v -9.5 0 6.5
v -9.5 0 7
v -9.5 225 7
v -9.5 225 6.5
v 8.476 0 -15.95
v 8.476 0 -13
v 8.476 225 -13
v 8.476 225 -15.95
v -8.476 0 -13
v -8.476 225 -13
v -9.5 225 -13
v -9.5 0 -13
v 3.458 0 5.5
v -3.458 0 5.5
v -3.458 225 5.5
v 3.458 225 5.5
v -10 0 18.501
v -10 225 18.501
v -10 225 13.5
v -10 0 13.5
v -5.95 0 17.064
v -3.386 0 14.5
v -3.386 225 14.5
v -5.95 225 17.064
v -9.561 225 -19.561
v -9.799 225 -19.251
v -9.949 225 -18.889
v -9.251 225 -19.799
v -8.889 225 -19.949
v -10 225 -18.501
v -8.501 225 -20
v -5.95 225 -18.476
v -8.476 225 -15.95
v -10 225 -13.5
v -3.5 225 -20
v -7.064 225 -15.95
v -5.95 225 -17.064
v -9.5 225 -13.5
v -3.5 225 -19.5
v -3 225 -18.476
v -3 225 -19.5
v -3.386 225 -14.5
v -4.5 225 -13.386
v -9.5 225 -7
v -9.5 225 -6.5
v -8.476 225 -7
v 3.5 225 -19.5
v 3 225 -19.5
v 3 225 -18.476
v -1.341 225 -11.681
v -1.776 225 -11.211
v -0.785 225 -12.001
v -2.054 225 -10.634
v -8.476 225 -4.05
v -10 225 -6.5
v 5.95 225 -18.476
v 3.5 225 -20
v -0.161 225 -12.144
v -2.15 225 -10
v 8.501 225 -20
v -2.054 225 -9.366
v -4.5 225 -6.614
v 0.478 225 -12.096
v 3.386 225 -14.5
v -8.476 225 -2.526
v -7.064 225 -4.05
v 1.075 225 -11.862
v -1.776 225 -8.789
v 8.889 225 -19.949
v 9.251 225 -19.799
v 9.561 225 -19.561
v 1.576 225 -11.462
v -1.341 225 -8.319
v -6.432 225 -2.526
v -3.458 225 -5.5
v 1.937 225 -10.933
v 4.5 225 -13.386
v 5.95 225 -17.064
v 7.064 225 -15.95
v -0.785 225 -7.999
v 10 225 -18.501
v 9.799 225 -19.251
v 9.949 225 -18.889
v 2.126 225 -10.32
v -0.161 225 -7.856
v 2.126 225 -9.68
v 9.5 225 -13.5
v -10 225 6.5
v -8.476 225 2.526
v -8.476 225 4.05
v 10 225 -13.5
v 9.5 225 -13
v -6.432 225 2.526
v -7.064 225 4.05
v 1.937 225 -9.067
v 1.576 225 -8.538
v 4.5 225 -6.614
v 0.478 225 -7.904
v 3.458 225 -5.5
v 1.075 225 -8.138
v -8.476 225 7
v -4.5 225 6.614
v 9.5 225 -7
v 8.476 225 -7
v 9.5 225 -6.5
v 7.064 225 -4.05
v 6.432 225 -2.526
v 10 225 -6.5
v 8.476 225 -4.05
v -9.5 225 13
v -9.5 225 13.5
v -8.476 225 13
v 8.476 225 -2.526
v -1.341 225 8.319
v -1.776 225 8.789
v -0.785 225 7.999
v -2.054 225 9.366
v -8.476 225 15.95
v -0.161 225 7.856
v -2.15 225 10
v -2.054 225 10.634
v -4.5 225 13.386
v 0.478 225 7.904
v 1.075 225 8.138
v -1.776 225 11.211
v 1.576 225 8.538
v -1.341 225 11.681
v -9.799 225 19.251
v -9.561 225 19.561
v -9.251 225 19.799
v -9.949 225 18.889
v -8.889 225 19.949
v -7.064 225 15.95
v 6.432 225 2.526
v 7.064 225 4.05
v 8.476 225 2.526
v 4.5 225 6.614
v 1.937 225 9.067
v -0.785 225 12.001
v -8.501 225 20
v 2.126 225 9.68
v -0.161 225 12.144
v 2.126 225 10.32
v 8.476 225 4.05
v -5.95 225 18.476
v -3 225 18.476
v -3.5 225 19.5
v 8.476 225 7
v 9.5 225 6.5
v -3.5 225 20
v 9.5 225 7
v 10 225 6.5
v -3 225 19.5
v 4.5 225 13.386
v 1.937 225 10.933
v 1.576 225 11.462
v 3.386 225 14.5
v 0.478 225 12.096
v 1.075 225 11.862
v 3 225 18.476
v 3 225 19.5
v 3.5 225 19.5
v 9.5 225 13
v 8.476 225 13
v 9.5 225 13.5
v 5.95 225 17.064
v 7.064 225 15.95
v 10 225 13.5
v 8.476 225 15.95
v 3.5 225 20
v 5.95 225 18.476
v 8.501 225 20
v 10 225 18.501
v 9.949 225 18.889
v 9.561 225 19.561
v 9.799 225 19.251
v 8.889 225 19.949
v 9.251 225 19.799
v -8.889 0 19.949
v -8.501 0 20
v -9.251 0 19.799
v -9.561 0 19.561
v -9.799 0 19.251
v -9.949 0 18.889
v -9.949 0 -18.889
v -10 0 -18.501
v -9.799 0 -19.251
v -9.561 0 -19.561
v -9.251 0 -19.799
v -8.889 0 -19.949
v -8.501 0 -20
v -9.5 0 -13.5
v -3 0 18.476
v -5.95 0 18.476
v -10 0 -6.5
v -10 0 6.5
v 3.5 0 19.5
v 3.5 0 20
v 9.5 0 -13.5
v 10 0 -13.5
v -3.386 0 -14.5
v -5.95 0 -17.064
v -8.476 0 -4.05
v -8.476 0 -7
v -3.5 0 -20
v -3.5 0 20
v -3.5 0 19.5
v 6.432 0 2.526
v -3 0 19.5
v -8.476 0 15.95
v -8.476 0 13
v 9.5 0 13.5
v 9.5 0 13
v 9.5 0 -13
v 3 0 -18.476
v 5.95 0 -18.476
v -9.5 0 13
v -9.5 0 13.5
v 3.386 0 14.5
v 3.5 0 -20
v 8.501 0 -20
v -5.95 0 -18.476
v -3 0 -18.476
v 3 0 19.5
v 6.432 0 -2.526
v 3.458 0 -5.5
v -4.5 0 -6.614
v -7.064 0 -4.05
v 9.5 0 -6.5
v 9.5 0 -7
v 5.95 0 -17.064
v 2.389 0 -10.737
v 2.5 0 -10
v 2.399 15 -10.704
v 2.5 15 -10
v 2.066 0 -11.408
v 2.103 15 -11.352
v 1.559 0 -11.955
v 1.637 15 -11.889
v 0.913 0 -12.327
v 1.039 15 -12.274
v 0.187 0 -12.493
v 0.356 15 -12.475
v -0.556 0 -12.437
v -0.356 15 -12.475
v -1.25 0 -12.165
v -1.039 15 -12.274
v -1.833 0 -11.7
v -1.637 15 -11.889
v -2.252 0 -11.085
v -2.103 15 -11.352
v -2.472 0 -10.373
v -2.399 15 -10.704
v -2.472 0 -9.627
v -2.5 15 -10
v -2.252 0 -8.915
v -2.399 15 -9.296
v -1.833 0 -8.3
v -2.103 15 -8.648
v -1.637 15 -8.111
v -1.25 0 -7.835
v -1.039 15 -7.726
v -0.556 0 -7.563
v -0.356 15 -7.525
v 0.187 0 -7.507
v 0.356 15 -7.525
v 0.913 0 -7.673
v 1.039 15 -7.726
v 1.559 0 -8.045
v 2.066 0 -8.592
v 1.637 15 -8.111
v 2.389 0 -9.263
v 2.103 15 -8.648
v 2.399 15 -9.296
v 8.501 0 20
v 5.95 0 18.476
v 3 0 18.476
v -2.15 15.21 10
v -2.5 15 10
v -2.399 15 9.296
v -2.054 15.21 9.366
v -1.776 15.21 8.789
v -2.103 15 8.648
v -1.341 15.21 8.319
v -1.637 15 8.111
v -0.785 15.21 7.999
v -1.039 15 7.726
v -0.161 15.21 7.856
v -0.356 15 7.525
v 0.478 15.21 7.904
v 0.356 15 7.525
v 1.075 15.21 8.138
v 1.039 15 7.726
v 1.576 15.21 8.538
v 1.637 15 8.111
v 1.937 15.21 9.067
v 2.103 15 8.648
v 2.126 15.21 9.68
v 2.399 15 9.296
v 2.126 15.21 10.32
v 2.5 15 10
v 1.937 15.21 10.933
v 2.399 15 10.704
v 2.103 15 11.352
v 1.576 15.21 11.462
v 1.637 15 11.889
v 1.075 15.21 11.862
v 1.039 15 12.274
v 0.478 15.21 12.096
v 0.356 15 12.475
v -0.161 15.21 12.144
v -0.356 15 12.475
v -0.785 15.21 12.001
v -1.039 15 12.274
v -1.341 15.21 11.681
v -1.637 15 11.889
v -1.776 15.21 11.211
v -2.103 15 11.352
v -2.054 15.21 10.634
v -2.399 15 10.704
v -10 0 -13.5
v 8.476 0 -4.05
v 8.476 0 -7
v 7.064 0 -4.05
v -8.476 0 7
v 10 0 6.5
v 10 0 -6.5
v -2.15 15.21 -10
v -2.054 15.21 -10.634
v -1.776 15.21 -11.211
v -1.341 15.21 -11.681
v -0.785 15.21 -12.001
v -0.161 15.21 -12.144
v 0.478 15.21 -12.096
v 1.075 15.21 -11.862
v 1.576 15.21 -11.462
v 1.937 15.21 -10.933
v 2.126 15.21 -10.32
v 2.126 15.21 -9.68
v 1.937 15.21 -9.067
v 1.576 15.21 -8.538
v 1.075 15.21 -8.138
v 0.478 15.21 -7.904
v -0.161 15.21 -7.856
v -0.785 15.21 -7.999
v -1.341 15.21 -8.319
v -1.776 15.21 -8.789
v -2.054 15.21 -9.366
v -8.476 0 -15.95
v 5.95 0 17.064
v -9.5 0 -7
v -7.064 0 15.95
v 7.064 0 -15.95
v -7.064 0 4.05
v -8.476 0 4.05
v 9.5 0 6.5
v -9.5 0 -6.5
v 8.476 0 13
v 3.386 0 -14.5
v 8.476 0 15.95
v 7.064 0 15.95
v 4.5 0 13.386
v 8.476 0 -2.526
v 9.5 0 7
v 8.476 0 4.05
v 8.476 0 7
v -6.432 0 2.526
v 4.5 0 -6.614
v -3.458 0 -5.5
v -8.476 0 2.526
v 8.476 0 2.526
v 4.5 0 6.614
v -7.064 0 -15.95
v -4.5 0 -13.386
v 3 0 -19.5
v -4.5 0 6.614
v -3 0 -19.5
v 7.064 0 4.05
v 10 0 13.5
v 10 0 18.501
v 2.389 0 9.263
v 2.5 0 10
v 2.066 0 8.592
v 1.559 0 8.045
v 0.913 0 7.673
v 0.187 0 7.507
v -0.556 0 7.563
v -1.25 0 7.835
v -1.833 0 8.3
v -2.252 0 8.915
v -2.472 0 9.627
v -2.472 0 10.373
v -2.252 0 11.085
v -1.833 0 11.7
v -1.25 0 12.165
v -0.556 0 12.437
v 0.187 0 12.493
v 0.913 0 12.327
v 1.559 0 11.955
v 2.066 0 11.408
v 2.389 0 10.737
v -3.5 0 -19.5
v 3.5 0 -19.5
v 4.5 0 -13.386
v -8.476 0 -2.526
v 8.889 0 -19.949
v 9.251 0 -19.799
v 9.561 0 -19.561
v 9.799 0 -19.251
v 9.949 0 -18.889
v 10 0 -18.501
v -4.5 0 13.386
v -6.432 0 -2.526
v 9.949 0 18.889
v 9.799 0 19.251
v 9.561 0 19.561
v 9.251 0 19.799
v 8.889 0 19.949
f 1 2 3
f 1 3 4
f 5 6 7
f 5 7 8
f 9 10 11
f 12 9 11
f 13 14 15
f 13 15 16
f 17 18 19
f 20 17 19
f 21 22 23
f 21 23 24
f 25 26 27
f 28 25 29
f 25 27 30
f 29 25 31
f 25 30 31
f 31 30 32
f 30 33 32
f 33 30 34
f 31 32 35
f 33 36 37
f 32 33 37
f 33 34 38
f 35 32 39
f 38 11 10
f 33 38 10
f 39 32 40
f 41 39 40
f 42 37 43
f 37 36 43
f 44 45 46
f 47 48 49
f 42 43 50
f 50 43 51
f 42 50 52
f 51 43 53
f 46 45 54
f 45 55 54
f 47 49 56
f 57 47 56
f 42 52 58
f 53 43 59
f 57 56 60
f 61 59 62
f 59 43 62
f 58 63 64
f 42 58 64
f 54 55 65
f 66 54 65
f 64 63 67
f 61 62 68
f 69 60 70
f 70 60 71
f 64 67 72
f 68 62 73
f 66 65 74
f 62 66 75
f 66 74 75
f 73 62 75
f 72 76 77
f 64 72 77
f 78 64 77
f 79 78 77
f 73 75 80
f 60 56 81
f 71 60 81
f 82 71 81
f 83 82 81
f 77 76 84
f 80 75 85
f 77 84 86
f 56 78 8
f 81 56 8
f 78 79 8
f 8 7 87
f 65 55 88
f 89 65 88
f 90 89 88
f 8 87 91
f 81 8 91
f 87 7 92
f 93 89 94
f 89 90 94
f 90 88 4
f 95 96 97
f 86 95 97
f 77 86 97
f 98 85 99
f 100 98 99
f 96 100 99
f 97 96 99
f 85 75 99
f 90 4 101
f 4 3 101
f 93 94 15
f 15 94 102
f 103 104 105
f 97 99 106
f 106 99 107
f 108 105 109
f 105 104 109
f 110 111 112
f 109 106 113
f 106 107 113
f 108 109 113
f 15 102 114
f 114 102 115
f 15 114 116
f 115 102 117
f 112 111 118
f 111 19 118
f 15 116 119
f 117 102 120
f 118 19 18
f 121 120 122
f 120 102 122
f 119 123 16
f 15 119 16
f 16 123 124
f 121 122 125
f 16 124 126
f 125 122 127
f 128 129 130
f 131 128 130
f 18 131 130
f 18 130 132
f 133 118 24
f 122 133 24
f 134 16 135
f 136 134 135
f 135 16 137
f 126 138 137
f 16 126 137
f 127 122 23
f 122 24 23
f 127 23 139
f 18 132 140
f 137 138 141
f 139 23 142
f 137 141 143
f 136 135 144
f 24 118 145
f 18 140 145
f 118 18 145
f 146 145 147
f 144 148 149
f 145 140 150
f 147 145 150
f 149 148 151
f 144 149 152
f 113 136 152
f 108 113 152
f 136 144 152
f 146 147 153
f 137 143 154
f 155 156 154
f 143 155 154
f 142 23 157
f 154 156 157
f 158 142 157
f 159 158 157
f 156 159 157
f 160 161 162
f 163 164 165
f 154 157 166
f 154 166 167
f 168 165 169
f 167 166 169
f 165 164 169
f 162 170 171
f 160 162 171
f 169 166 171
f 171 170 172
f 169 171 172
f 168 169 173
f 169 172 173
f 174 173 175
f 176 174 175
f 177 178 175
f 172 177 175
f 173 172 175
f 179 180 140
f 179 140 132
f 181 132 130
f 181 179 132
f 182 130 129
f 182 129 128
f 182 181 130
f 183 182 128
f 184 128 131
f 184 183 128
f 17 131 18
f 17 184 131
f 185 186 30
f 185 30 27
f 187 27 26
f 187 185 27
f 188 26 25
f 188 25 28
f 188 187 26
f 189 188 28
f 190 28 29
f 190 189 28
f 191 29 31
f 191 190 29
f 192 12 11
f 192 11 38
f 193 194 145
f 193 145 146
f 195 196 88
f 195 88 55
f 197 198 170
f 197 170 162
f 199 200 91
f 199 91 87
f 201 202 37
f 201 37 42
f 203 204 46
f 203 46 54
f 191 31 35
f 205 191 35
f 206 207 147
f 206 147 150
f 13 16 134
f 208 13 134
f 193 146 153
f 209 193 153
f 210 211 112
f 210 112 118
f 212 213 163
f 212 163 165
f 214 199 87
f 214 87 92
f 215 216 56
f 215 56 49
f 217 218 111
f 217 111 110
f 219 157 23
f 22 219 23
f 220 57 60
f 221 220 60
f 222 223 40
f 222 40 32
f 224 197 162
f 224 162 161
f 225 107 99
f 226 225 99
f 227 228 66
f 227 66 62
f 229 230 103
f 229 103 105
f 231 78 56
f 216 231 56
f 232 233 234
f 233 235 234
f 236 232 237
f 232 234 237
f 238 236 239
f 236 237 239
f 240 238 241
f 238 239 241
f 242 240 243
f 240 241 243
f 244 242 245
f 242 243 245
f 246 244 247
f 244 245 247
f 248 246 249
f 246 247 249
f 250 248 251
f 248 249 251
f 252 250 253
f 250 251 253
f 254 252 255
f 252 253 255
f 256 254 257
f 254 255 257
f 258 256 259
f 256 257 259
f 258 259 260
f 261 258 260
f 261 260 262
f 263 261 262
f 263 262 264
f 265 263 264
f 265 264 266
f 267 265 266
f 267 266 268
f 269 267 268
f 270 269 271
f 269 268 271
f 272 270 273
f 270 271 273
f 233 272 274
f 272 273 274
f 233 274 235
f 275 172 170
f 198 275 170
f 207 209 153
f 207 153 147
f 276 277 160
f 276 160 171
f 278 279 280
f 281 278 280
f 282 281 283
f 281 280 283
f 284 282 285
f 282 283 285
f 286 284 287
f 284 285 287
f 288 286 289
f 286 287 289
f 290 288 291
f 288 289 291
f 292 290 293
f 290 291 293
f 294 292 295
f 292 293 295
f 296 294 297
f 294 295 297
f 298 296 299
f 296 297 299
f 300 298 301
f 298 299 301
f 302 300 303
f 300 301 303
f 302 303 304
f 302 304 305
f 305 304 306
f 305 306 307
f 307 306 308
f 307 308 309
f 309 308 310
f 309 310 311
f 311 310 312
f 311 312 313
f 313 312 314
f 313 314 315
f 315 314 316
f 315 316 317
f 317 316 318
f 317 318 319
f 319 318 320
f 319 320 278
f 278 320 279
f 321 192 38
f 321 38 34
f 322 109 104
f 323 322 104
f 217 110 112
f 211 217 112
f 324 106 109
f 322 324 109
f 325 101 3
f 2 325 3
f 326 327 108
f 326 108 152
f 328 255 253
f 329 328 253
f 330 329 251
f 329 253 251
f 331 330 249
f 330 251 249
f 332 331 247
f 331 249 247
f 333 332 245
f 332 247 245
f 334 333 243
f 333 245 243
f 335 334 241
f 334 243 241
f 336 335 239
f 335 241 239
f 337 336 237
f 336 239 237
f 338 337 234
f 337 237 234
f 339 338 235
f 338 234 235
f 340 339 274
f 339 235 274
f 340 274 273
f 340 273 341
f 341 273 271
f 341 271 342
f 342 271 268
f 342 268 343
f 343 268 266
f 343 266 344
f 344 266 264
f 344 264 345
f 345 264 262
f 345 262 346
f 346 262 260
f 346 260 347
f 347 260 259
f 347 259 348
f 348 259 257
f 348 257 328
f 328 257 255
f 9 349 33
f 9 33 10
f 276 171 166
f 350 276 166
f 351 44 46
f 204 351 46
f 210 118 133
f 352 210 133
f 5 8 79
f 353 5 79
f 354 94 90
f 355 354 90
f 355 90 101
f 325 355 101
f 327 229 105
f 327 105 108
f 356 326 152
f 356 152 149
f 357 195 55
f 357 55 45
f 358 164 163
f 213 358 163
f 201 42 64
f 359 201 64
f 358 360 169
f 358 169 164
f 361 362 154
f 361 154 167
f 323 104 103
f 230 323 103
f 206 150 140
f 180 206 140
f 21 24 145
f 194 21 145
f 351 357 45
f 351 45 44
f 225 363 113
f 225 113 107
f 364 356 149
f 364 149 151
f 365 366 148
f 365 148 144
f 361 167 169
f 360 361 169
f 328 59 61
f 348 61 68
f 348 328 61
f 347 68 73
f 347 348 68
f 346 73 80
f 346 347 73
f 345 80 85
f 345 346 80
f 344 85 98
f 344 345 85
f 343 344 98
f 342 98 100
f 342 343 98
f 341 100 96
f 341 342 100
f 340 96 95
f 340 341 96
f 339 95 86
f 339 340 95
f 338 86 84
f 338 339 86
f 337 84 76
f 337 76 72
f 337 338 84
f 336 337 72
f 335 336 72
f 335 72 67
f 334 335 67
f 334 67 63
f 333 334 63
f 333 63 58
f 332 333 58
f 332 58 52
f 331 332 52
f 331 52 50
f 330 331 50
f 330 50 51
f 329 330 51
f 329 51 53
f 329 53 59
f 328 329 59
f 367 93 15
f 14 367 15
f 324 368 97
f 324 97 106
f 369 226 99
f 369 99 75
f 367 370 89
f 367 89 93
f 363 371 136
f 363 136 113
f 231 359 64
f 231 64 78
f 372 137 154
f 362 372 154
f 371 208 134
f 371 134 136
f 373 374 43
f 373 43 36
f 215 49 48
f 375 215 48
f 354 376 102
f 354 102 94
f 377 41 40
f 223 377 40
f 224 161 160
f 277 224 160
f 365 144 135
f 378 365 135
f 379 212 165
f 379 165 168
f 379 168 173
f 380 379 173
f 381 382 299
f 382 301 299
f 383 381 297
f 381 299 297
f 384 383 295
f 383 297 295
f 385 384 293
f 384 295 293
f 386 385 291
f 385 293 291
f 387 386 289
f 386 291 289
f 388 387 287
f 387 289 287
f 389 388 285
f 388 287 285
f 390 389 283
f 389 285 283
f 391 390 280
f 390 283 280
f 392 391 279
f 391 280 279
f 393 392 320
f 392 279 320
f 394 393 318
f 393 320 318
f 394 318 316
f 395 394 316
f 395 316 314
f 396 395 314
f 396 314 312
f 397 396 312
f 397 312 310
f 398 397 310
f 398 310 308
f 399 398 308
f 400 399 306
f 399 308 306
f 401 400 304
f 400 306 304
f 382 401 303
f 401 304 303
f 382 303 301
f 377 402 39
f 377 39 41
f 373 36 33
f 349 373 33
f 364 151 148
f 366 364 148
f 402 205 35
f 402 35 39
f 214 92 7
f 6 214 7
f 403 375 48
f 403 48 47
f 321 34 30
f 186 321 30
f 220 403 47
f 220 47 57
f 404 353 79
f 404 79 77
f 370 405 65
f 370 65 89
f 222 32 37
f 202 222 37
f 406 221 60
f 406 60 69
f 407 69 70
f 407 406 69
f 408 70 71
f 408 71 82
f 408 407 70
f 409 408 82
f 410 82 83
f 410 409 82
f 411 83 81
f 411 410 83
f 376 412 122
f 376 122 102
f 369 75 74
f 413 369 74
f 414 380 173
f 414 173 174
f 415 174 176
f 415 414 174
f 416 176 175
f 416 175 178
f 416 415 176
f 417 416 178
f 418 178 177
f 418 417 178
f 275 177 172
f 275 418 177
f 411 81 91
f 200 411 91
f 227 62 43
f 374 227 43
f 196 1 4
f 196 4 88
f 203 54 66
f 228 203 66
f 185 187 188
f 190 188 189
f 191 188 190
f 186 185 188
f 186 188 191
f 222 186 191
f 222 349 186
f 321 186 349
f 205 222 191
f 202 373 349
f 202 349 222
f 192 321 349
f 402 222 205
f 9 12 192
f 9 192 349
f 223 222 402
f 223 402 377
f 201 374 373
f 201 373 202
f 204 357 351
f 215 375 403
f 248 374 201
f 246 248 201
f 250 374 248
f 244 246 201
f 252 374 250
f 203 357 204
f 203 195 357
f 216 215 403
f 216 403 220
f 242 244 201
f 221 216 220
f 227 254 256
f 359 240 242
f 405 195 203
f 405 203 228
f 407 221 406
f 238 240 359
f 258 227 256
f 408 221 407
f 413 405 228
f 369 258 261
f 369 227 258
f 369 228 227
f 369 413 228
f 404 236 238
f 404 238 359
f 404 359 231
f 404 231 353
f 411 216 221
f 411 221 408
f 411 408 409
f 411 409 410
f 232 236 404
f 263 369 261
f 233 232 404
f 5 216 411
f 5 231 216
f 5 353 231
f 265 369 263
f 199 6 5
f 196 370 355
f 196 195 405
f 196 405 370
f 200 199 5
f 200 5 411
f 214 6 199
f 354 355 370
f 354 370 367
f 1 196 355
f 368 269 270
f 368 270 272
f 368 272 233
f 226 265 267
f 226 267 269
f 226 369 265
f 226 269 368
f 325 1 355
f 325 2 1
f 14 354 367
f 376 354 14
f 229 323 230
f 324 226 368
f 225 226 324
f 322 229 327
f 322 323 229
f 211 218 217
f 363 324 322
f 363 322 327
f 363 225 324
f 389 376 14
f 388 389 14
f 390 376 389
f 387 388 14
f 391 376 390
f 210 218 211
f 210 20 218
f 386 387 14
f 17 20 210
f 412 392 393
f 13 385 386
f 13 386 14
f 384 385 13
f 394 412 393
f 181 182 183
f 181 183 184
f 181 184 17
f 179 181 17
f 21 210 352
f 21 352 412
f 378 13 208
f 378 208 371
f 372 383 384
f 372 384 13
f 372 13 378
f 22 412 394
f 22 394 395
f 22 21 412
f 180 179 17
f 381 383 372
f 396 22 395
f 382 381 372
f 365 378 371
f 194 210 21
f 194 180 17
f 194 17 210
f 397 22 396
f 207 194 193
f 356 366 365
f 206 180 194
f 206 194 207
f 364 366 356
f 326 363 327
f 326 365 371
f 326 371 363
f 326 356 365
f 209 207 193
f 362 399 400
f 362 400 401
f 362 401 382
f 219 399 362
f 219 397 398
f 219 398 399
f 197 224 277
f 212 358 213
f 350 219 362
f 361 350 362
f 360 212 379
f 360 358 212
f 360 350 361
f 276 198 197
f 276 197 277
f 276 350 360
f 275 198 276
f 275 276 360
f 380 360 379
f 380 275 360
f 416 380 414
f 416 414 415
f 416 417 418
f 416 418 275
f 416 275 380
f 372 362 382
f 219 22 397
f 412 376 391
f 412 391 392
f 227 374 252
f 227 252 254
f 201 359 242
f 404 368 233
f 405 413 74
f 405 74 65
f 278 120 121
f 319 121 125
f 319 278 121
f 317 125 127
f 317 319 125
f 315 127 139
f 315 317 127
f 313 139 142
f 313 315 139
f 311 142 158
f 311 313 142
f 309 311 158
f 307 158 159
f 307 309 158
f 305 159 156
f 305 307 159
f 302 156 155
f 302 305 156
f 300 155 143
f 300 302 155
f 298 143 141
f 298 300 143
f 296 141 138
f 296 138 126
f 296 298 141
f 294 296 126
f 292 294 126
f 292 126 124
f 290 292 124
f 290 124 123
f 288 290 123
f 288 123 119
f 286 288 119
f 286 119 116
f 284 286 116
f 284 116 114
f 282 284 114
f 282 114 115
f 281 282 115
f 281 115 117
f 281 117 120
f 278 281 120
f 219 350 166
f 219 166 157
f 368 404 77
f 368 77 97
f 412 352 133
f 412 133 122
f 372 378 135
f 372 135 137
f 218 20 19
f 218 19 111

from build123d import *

# Parameters (mm, degrees)
SKETCH22_R                       = 2.15
F_20_SERIES_TS20_40B_5MM_1_DEPTH = 225
M6X1_0_TAPPED_HOLE2_D            = 5
M6X1_0_TAPPED_HOLE2_DEPTH        = 15
M6X1_0_TAPPED_HOLE2_TIP          = 1.502151548


with BuildPart() as part:
    # Sketch22 → 20 series TS20-40B_5MM(1) (new body)
    with BuildSketch(Plane(origin=(0, 0, 0), x_dir=(-1, 0, 0), z_dir=(0, 1, 0))):
        with BuildLine():
            Line((-9.5, 7), (-8.476, 7))
            Line((-8.476, 7), (-8.476, 4.05))
            Line((-8.476, 4.05), (-7.063551759, 4.05))
            Line((-7.063551759, 4.05), (-4.5, 6.613551759))
            Line((-4.5, 6.613551759), (-4.5, 13.386448241))
            Line((-4.5, 13.386448241), (-7.063551759, 15.95))
            Line((-7.063551759, 15.95), (-8.476, 15.95))
            Line((-8.476, 15.95), (-8.476, 13))
            Line((-8.476, 13), (-9.5, 13))
            Line((-9.5, 13), (-9.5, 13.5))
            Line((-9.5, 13.5), (-10, 13.5))
            Line((-10, 13.5), (-10, 18.5014))
            ThreePointArc((-10, 18.5014), (-9.561070222, 19.561070222), (-8.5014, 20))
            Line((-8.5014, 20), (-3.5, 20))
            Line((-3.5, 20), (-3.5, 19.5))
            Line((-3.5, 19.5), (-3, 19.5))
            Line((-3, 19.5), (-3, 18.476))
            Line((-3, 18.476), (-5.95, 18.476))
            Line((-5.95, 18.476), (-5.95, 17.063551759))
            Line((-5.95, 17.063551759), (-3.386448241, 14.5))
            Line((-3.386448241, 14.5), (3.386448241, 14.5))
            Line((3.386448241, 14.5), (5.95, 17.063551759))
            Line((5.95, 17.063551759), (5.95, 18.476))
            Line((5.95, 18.476), (3, 18.476))
            Line((3, 18.476), (3, 19.5))
            Line((3, 19.5), (3.5, 19.5))
            Line((3.5, 19.5), (3.5, 20))
            Line((3.5, 20), (8.5014, 20))
            ThreePointArc((8.5014, 20), (9.561070222, 19.561070222), (10, 18.5014))
            Line((10, 18.5014), (10, 13.5))
            Line((10, 13.5), (9.5, 13.5))
            Line((9.5, 13.5), (9.5, 13))
            Line((9.5, 13), (8.476, 13))
            Line((8.476, 13), (8.476, 15.95))
            Line((8.476, 15.95), (7.063551759, 15.95))
            Line((7.063551759, 15.95), (4.5, 13.386448241))
            Line((4.5, 13.386448241), (4.5, 6.613551759))
            Line((4.5, 6.613551759), (7.063551759, 4.05))
            Line((7.063551759, 4.05), (8.476, 4.05))
            Line((8.476, 4.05), (8.476, 7))
            Line((8.476, 7), (9.5, 7))
            Line((9.5, 7), (9.5, 6.5))
            Line((9.5, 6.5), (10, 6.5))
            Line((10, 6.5), (10, -6.5))
            Line((10, -6.5), (9.5, -6.5))
            Line((9.5, -6.5), (9.5, -7))
            Line((9.5, -7), (8.476, -7))
            Line((8.476, -7), (8.476, -4.05))
            Line((8.476, -4.05), (7.063551759, -4.05))
            Line((7.063551759, -4.05), (4.5, -6.613551759))
            Line((4.5, -6.613551759), (4.5, -13.386448241))
            Line((4.5, -13.386448241), (7.063551759, -15.95))
            Line((7.063551759, -15.95), (8.476, -15.95))
            Line((8.476, -15.95), (8.476, -13))
            Line((8.476, -13), (9.5, -13))
            Line((9.5, -13), (9.5, -13.5))
            Line((9.5, -13.5), (10, -13.5))
            Line((10, -13.5), (10, -18.5014))
            ThreePointArc((10, -18.5014), (9.561070222, -19.561070222), (8.5014, -20))
            Line((8.5014, -20), (3.5, -20))
            Line((3.5, -20), (3.5, -19.5))
            Line((3.5, -19.5), (3, -19.5))
            Line((3, -19.5), (3, -18.476))
            Line((3, -18.476), (5.95, -18.476))
            Line((5.95, -18.476), (5.95, -17.063551759))
            Line((5.95, -17.063551759), (3.386448241, -14.5))
            Line((3.386448241, -14.5), (-3.386448241, -14.5))
            Line((-3.386448241, -14.5), (-5.95, -17.063551759))
            Line((-5.95, -17.063551759), (-5.95, -18.476))
            Line((-5.95, -18.476), (-3, -18.476))
            Line((-3, -18.476), (-3, -19.5))
            Line((-3, -19.5), (-3.5, -19.5))
            Line((-3.5, -19.5), (-3.5, -20))
            Line((-3.5, -20), (-8.5014, -20))
            ThreePointArc((-8.5014, -20), (-9.561070222, -19.561070222), (-10, -18.5014))
            Line((-10, -18.5014), (-10, -13.5))
            Line((-10, -13.5), (-9.5, -13.5))
            Line((-9.5, -13.5), (-9.5, -13))
            Line((-9.5, -13), (-8.476, -13))
            Line((-8.476, -13), (-8.476, -15.95))
            Line((-8.476, -15.95), (-7.063551759, -15.95))
            Line((-7.063551759, -15.95), (-4.5, -13.386448241))
            Line((-4.5, -13.386448241), (-4.5, -6.613551759))
            Line((-4.5, -6.613551759), (-7.063551759, -4.05))
            Line((-7.063551759, -4.05), (-8.476, -4.05))
            Line((-8.476, -4.05), (-8.476, -7))
            Line((-8.476, -7), (-9.5, -7))
            Line((-9.5, -7), (-9.5, -6.5))
            Line((-9.5, -6.5), (-10, -6.5))
            Line((-10, -6.5), (-10, 6.5))
            Line((-10, 6.5), (-9.5, 6.5))
            Line((-9.5, 6.5), (-9.5, 7))
        make_face()
        with Locations((0, 10)):
            Circle(SKETCH22_R, mode=Mode.SUBTRACT)
        with Locations((0, -10)):
            Circle(SKETCH22_R, mode=Mode.SUBTRACT)
        Polygon((-3.45829029, 5.5), (-6.43229029, 2.526), (-8.476, 2.526), (-8.476, -2.526), (-6.43229029, -2.526), (-3.45829029, -5.5), (3.45829029, -5.5), (6.43229029, -2.526), (8.476, -2.526), (8.476, 2.526), (6.43229029, 2.526), (3.45829029, 5.5), align=None, mode=Mode.SUBTRACT)
    extrude(amount=F_20_SERIES_TS20_40B_5MM_1_DEPTH)

    # M6x1.0 Tapped Hole2
    with Locations(Plane(origin=(0, 0, 0), x_dir=(-1, 0, 0), z_dir=(0, -1, 0))):
        with Locations((0, 10), (0, -10)):
            Hole(M6X1_0_TAPPED_HOLE2_D / 2, depth=M6X1_0_TAPPED_HOLE2_DEPTH)
            with Locations((0, 0, -(M6X1_0_TAPPED_HOLE2_DEPTH + M6X1_0_TAPPED_HOLE2_TIP / 2))):  # 118° drill point
                Cone(0, M6X1_0_TAPPED_HOLE2_D / 2, M6X1_0_TAPPED_HOLE2_TIP, mode=Mode.SUBTRACT)


solid = part.part
